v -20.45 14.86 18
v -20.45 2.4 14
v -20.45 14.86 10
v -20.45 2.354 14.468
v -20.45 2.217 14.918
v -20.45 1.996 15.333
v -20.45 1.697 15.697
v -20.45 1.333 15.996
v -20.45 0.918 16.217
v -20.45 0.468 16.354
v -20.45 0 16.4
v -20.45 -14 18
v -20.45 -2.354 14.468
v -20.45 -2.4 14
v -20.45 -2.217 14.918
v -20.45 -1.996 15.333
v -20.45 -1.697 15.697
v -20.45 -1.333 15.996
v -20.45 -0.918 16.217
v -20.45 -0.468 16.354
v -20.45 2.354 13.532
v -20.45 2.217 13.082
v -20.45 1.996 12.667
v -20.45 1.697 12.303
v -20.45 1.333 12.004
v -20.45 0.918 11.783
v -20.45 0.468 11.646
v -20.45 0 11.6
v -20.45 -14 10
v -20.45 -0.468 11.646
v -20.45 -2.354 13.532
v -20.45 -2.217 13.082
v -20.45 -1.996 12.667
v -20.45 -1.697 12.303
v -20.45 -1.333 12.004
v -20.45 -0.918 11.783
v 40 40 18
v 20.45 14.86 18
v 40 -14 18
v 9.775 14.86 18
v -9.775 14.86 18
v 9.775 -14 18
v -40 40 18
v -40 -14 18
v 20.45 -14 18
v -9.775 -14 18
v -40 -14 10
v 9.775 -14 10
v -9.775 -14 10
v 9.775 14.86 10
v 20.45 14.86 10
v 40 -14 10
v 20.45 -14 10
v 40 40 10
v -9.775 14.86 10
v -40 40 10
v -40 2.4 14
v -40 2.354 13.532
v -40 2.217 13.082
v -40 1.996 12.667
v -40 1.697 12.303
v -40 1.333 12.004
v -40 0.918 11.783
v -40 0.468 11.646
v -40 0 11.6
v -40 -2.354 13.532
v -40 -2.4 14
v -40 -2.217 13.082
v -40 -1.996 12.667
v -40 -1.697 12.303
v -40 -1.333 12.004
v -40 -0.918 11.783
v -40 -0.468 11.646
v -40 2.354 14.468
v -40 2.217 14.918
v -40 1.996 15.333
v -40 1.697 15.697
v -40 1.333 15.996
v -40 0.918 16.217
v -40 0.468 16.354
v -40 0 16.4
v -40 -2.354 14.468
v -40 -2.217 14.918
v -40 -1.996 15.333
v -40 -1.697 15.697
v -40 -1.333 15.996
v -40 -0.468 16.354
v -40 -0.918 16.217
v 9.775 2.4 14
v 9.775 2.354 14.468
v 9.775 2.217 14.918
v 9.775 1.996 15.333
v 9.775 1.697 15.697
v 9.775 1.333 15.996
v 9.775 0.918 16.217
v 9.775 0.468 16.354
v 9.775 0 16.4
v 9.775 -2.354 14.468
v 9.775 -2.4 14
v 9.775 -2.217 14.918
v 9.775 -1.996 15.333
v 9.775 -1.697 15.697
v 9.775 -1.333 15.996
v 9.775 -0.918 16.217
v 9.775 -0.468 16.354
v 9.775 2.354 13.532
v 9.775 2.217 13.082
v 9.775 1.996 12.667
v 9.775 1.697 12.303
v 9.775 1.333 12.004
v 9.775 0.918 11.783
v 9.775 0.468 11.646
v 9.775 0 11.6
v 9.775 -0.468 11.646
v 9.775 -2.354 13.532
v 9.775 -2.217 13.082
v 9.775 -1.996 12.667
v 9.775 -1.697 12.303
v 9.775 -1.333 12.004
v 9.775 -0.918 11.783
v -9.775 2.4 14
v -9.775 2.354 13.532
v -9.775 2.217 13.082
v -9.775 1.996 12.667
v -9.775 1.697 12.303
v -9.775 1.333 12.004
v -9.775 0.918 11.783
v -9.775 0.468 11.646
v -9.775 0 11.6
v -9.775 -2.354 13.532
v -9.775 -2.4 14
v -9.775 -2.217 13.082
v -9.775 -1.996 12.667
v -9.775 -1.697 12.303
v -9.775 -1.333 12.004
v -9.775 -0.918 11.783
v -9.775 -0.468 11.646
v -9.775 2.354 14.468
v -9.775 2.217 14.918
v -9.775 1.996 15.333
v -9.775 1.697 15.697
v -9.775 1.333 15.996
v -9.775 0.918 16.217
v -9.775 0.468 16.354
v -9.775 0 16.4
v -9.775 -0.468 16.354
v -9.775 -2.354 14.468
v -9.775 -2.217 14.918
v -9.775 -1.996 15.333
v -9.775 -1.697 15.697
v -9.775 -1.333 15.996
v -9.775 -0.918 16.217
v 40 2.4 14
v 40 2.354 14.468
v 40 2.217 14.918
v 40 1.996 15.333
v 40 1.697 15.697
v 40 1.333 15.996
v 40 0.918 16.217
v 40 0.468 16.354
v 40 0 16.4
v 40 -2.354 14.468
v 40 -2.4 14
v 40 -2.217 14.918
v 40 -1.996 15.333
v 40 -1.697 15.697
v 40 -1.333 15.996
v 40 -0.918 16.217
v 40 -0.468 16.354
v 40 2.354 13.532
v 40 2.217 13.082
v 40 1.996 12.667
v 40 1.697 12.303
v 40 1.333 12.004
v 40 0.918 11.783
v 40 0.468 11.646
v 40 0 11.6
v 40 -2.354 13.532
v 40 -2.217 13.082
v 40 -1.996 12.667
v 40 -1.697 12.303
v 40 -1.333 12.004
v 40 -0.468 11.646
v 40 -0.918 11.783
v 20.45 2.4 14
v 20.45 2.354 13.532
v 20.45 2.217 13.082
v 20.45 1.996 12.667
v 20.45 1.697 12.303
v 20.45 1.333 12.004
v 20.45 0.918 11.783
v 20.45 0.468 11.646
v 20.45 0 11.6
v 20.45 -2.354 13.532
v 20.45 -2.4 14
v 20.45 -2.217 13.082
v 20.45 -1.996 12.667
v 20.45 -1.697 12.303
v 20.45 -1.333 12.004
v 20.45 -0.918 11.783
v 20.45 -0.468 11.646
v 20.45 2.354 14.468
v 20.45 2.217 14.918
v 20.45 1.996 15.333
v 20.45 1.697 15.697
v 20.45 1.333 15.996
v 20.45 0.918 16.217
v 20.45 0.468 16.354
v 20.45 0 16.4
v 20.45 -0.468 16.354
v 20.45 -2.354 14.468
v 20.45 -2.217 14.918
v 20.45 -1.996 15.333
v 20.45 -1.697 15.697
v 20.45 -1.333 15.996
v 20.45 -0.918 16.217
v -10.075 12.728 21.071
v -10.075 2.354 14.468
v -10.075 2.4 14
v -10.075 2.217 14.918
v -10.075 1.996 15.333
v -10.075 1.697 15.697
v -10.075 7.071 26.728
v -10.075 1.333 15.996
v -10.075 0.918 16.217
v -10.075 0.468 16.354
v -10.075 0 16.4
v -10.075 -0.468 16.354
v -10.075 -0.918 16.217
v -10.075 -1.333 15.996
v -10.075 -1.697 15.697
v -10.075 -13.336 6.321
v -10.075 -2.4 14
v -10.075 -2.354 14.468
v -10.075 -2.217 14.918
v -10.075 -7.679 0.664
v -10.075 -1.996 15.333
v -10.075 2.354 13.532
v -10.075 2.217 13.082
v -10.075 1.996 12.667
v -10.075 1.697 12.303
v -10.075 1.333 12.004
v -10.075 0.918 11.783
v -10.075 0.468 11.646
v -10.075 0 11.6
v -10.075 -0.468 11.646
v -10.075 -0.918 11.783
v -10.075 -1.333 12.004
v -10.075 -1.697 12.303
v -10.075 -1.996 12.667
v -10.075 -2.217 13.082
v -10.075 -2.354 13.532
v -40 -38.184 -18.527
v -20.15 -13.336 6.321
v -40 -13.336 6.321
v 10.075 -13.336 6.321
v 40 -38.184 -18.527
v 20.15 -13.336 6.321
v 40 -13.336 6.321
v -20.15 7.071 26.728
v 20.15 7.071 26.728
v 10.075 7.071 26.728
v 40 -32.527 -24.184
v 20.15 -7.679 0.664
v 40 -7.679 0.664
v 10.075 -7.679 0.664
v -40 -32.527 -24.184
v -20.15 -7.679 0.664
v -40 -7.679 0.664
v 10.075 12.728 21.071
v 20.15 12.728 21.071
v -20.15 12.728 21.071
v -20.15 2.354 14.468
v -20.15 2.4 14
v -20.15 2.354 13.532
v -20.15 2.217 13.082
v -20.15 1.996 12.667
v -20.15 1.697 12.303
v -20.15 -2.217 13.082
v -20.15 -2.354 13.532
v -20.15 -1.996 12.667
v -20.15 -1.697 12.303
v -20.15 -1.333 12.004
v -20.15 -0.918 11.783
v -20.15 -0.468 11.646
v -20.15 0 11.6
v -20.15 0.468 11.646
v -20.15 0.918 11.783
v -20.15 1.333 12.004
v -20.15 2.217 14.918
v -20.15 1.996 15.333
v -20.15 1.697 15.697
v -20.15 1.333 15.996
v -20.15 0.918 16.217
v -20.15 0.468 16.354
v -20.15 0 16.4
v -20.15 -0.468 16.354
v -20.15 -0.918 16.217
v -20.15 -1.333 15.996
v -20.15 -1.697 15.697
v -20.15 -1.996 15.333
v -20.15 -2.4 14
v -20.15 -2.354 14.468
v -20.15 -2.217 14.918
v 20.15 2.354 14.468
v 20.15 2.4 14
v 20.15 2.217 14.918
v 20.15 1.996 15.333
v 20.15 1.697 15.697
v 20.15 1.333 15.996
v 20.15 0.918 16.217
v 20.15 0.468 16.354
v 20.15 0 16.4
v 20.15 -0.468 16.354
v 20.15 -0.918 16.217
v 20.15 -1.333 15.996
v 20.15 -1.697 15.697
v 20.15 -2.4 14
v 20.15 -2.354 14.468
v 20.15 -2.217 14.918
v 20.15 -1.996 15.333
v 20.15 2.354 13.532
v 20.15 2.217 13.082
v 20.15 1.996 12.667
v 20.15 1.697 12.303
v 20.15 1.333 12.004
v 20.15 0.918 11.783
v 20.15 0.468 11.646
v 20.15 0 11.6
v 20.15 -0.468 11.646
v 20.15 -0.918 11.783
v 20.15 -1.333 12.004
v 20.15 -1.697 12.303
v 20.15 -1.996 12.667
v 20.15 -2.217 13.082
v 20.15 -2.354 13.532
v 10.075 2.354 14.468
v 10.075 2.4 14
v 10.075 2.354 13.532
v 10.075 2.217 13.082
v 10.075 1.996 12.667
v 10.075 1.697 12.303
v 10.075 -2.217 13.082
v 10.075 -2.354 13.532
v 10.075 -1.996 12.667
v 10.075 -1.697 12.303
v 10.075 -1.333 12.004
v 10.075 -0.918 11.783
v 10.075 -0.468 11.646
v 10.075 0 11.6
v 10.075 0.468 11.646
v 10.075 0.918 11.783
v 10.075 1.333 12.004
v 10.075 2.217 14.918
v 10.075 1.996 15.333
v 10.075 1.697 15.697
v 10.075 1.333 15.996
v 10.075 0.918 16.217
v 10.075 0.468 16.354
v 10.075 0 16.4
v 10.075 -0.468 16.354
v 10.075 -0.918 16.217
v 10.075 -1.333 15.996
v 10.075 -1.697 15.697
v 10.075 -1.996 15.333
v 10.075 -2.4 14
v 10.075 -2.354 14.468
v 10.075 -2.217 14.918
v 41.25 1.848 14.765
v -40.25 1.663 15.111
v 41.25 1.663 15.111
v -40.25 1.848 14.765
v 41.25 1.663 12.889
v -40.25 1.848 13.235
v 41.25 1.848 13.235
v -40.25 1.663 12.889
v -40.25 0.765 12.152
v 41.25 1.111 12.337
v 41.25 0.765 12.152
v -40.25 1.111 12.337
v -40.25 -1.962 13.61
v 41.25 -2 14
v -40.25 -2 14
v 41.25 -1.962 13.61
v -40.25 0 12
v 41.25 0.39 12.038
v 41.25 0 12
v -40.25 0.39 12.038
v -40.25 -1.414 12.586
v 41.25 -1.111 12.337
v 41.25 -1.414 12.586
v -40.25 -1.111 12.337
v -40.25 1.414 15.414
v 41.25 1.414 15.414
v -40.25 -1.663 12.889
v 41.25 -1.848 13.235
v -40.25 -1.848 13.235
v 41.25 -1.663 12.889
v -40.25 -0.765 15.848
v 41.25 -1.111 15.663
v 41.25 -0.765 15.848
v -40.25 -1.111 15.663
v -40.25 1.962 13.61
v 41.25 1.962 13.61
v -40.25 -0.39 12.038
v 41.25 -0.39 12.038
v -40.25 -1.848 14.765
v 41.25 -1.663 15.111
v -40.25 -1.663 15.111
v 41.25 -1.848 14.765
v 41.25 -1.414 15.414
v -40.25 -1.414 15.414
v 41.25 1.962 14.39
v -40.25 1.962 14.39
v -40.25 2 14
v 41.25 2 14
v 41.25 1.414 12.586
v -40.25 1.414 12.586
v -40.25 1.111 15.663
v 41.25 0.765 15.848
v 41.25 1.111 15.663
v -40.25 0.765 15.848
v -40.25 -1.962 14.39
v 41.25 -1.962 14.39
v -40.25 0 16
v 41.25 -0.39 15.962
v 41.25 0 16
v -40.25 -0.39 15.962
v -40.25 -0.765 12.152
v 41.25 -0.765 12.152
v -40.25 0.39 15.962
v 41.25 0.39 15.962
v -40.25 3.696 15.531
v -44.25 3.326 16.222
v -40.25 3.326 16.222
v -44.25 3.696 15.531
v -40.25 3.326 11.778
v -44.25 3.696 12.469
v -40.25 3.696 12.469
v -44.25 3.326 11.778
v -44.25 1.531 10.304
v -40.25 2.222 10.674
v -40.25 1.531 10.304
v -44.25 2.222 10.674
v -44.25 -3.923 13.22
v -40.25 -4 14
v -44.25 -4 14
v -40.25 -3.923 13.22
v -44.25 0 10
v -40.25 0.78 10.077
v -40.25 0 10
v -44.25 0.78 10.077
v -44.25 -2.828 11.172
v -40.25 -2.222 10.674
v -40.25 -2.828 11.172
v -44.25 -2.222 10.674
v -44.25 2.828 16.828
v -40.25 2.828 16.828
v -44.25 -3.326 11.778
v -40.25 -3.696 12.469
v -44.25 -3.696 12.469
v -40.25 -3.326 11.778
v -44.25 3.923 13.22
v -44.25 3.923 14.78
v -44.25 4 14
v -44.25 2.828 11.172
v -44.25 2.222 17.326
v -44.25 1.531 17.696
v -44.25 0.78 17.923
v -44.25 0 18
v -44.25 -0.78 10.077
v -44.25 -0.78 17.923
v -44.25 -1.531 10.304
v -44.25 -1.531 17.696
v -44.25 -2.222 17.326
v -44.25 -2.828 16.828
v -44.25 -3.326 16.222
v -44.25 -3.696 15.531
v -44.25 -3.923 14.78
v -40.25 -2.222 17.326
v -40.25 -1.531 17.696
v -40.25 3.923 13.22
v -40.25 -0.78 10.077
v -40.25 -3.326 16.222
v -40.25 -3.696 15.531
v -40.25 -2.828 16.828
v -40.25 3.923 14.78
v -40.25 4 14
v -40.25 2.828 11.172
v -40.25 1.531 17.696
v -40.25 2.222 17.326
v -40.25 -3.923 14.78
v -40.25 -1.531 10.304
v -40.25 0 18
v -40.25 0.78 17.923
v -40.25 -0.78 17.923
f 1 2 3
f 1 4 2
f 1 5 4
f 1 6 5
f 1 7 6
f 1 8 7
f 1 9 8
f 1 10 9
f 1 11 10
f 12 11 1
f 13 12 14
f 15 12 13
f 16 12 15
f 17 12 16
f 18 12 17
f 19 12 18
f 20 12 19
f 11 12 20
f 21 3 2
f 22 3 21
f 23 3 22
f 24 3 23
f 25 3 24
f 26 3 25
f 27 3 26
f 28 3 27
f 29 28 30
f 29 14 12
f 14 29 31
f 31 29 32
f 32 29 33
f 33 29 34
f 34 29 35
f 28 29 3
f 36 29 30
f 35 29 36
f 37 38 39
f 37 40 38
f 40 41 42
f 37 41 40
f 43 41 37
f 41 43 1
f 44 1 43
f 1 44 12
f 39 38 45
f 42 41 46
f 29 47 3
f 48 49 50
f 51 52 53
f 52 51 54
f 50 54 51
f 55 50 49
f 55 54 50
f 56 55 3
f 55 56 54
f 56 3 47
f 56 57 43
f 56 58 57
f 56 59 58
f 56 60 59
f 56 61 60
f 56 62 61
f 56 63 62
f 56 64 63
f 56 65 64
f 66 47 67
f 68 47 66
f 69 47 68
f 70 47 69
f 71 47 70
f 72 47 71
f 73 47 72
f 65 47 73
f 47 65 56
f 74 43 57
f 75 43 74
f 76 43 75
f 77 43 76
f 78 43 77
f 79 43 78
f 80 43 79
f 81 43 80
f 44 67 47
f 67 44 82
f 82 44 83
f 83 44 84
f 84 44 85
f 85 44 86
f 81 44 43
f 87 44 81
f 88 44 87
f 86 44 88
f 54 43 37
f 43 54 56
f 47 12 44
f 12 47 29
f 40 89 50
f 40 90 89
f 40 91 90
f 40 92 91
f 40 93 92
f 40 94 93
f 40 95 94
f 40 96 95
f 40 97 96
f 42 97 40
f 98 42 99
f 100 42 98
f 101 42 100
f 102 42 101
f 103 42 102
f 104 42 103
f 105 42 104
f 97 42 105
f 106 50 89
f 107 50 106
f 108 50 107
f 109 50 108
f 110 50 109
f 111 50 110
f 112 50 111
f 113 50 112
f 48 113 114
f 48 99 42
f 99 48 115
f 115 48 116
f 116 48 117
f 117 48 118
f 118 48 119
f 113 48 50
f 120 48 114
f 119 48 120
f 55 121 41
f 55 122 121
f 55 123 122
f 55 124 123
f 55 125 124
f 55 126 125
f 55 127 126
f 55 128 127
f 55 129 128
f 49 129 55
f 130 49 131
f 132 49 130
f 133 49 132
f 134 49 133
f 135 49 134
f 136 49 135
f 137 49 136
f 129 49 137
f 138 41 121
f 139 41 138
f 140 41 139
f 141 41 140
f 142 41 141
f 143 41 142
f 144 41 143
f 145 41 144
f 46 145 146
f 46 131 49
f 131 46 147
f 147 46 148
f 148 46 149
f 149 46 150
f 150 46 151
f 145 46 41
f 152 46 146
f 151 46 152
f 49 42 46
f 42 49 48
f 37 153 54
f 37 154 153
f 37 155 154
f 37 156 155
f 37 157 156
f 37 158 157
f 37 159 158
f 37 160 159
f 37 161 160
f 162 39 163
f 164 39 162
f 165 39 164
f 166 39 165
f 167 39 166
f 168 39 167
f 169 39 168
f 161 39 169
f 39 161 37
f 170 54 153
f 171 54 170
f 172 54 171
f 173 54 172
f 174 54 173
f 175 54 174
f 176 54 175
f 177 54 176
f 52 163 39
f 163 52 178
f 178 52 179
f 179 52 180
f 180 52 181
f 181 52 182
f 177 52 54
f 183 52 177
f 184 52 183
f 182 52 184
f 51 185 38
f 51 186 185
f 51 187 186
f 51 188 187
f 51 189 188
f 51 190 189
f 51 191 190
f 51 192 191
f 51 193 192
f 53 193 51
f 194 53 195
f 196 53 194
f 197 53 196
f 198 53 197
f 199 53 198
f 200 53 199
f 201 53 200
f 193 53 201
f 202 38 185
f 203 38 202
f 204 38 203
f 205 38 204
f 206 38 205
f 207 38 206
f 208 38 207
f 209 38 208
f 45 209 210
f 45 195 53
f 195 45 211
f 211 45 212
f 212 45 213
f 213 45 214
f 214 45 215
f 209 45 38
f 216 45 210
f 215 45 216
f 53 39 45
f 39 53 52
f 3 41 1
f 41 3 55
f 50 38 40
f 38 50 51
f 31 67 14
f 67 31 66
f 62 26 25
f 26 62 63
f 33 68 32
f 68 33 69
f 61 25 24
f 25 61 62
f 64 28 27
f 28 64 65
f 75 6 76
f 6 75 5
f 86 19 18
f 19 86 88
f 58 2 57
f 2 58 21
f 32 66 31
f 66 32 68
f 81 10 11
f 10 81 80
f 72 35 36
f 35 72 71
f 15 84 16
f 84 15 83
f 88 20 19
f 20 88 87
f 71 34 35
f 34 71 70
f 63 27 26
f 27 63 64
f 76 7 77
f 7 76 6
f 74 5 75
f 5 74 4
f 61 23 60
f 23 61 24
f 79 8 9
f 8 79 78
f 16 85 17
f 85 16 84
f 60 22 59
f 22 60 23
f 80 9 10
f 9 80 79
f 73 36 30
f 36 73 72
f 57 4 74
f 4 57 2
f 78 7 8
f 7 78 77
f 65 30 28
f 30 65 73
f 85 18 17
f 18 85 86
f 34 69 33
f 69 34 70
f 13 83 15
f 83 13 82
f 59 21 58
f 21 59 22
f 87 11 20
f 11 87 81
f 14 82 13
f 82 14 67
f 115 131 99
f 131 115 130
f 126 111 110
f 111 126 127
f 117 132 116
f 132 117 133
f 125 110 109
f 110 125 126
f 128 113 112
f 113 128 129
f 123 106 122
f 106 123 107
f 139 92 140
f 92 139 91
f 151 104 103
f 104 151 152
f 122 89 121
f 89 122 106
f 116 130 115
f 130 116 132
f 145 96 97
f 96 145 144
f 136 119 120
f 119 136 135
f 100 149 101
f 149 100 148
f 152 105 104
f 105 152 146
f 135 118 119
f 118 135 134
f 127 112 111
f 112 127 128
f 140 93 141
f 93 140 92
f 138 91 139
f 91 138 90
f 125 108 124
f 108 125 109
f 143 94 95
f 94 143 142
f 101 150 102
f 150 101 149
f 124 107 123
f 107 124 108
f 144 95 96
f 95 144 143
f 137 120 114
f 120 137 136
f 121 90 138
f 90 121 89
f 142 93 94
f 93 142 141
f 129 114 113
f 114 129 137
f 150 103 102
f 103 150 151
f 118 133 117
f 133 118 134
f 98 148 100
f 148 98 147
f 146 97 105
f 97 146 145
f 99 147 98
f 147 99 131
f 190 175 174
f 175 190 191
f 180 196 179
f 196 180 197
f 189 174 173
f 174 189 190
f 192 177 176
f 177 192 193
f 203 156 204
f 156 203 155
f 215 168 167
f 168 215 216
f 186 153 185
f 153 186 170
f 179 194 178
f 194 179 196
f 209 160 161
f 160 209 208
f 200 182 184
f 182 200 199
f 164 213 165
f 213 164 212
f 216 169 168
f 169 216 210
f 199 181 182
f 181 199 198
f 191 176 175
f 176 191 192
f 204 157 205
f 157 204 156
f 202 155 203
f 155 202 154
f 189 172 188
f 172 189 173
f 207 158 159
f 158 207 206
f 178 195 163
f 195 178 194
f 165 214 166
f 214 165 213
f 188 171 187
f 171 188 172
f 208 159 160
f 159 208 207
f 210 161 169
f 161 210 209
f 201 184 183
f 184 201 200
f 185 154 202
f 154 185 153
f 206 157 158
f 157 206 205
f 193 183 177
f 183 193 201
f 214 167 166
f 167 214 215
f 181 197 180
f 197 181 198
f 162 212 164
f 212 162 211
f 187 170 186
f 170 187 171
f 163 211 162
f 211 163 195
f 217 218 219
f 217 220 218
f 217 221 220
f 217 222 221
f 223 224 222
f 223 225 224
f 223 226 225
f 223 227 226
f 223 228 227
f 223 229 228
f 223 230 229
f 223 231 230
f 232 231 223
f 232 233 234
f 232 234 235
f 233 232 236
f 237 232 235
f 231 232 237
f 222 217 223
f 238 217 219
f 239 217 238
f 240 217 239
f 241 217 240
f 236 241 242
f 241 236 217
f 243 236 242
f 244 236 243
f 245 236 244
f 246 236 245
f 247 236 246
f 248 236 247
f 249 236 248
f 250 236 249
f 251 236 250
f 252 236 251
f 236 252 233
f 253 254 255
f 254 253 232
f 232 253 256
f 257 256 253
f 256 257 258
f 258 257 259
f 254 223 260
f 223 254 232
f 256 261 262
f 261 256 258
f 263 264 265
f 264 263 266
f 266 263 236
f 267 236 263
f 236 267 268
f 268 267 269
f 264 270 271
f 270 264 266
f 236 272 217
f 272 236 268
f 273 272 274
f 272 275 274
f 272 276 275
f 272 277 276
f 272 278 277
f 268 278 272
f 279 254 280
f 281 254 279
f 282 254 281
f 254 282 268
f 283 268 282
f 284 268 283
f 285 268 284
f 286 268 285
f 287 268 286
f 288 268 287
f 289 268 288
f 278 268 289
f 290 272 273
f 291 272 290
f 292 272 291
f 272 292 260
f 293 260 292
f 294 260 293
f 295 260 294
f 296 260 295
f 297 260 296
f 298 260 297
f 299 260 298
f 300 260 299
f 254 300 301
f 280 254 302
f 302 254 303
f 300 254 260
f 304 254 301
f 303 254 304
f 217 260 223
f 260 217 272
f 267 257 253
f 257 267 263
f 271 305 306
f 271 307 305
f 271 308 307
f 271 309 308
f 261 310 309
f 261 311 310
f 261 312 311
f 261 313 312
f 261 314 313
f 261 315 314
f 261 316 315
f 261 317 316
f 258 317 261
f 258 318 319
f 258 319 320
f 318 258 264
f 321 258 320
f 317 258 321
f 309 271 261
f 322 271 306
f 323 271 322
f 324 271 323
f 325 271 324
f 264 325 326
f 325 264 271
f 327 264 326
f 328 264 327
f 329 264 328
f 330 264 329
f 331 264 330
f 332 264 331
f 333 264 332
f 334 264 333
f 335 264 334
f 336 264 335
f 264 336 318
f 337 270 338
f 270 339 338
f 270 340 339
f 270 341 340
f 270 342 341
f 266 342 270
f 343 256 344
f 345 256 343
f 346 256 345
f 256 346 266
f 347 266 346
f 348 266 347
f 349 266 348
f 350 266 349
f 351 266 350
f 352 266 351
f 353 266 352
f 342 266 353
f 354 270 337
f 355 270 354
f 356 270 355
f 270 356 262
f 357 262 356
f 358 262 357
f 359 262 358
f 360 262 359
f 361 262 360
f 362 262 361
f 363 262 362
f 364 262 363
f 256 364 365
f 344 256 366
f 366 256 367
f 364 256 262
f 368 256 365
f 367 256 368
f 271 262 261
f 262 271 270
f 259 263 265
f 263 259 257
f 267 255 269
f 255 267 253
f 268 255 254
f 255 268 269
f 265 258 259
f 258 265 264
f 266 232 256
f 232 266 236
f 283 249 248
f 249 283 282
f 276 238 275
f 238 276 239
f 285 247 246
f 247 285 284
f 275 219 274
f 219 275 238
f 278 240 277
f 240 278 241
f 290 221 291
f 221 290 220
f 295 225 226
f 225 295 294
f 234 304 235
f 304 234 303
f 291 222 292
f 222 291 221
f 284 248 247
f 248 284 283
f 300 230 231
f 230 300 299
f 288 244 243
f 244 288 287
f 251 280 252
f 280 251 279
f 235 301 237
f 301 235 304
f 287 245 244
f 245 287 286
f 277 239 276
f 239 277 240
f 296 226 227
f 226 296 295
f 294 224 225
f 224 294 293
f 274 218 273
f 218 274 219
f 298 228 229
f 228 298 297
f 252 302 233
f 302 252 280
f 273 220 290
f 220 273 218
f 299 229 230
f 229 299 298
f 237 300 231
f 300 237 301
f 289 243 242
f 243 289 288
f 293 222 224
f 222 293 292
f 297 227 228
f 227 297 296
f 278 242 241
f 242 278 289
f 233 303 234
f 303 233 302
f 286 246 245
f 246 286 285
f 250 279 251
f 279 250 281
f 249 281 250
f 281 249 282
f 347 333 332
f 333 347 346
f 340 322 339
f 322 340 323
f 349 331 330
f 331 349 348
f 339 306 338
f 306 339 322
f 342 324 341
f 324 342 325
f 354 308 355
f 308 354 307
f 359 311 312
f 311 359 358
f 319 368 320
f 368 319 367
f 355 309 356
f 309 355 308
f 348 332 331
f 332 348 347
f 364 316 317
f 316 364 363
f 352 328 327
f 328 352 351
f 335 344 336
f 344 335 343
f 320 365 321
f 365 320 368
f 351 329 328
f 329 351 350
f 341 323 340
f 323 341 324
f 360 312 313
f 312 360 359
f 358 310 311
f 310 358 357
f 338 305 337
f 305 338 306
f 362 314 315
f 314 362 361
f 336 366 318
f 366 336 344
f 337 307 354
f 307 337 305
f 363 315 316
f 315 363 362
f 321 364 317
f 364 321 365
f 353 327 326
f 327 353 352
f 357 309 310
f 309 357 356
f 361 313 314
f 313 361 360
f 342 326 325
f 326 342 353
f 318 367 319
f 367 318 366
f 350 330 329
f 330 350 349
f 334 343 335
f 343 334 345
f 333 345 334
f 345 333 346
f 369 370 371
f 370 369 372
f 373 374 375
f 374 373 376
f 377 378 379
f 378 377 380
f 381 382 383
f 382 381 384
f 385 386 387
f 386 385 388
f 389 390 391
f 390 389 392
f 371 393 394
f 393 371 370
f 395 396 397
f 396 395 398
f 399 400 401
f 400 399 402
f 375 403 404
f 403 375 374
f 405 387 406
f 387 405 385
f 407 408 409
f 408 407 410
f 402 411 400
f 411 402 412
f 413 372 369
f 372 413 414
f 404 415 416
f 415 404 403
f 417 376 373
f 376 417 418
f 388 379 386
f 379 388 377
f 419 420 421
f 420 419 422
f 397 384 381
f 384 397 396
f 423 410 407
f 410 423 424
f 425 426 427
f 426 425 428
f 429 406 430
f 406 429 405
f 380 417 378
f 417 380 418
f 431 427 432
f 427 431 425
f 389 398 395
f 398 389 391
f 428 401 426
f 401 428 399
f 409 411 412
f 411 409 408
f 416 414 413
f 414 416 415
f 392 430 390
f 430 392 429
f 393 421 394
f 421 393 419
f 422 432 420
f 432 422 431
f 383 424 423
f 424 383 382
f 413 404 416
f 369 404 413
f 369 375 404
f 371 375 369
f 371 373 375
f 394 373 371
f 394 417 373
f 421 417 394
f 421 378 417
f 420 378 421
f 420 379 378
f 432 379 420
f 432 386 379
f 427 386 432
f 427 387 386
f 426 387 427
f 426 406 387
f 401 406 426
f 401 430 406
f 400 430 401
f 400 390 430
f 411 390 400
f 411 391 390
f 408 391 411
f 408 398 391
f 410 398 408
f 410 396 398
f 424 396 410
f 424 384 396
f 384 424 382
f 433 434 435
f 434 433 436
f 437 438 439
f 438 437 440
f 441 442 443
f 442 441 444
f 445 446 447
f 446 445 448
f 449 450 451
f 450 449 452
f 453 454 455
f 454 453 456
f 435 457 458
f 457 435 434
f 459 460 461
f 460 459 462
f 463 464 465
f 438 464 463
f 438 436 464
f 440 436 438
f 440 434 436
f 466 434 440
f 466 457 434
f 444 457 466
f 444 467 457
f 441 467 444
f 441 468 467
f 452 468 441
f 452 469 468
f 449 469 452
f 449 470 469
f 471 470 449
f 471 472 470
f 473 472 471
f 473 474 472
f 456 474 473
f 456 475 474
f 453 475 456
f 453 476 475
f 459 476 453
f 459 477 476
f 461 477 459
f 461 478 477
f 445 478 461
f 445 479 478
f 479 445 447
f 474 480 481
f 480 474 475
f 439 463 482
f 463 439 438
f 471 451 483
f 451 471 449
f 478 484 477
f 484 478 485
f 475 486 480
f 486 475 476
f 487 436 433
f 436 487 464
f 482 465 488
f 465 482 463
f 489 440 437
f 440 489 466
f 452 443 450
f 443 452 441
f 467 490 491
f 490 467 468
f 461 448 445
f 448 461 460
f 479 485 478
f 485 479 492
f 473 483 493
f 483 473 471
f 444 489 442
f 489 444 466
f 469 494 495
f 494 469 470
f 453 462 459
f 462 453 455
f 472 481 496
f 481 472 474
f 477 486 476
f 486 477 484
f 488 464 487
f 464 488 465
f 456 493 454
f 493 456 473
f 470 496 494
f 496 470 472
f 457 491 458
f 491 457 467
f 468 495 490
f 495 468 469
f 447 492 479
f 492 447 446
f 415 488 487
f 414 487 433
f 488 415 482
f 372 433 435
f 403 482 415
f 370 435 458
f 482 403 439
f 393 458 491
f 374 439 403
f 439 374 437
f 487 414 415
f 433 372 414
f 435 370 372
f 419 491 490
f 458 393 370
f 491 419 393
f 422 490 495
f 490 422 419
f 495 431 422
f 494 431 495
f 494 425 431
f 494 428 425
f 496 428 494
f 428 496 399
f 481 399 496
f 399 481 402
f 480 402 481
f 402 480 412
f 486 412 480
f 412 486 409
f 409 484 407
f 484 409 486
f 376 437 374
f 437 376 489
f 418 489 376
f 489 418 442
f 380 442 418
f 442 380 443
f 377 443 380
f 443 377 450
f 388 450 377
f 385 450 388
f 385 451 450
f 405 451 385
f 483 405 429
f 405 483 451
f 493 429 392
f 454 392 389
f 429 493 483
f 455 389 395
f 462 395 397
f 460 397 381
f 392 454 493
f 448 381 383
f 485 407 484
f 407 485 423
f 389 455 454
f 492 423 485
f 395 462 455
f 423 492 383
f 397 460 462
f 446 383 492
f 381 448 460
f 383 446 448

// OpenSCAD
$fn = 32;

// ------------------------------------------------------------------------
// Butt hinge: hinge 80 mm, leaf swung 45 deg
// Every part is its own module, assembly() places every instance.
// ------------------------------------------------------------------------

// --- part 1 ---
module hinge_base() {
  difference() {
    union() {
      translate([-40, -14, -4]) cube([19.55, 54, 8]);
      translate([-9.775, -14, -4]) cube([19.55, 54, 8]);
      translate([20.45, -14, -4]) cube([19.55, 54, 8]);
      translate([-40, 14.86, -4]) cube([80, 25.14, 8]);
    }
    translate([-30.225, 0, 0]) rotate([0, 90, 0]) cylinder(h = 21.55, d = 4.8, center = true);
    translate([0, 0, 0]) rotate([0, 90, 0]) cylinder(h = 21.55, d = 4.8, center = true);
    translate([30.225, 0, 0]) rotate([0, 90, 0]) cylinder(h = 21.55, d = 4.8, center = true);
  }
}

// --- part 2 ---
module hinge_mover() {
  difference() {
    union() {
      translate([-20.15, -50, -4]) cube([10.075, 64, 8]);
      translate([10.075, -50, -4]) cube([10.075, 64, 8]);
      translate([-40, -50, -4]) cube([80, 35.14, 8]);
    }
    translate([-15.113, 0, 0]) rotate([0, 90, 0]) cylinder(h = 12.075, d = 4.8, center = true);
    translate([15.113, 0, 0]) rotate([0, 90, 0]) cylinder(h = 12.075, d = 4.8, center = true);
  }
}

// --- part 3 ---
module hinge_pin() {
  rotate([0, 90, 0]) cylinder(h = 82.5, d = 4, center = true);
  translate([-44.25, 0, 0]) rotate([0, 90, 0]) cylinder(h = 4, d = 8);
}

// --- assembly ---
module assembly() {
  color([0.80, 0.24, 0.20]) translate([0, 0, 14]) rotate([0, 0, 0]) hinge_base();
  color([0.20, 0.45, 0.75]) translate([0, 0, 14]) rotate([45, 0, 0]) hinge_mover();
  color([0.25, 0.62, 0.32]) translate([0, 0, 14]) rotate([0, 0, 0]) hinge_pin();
}

assembly();
